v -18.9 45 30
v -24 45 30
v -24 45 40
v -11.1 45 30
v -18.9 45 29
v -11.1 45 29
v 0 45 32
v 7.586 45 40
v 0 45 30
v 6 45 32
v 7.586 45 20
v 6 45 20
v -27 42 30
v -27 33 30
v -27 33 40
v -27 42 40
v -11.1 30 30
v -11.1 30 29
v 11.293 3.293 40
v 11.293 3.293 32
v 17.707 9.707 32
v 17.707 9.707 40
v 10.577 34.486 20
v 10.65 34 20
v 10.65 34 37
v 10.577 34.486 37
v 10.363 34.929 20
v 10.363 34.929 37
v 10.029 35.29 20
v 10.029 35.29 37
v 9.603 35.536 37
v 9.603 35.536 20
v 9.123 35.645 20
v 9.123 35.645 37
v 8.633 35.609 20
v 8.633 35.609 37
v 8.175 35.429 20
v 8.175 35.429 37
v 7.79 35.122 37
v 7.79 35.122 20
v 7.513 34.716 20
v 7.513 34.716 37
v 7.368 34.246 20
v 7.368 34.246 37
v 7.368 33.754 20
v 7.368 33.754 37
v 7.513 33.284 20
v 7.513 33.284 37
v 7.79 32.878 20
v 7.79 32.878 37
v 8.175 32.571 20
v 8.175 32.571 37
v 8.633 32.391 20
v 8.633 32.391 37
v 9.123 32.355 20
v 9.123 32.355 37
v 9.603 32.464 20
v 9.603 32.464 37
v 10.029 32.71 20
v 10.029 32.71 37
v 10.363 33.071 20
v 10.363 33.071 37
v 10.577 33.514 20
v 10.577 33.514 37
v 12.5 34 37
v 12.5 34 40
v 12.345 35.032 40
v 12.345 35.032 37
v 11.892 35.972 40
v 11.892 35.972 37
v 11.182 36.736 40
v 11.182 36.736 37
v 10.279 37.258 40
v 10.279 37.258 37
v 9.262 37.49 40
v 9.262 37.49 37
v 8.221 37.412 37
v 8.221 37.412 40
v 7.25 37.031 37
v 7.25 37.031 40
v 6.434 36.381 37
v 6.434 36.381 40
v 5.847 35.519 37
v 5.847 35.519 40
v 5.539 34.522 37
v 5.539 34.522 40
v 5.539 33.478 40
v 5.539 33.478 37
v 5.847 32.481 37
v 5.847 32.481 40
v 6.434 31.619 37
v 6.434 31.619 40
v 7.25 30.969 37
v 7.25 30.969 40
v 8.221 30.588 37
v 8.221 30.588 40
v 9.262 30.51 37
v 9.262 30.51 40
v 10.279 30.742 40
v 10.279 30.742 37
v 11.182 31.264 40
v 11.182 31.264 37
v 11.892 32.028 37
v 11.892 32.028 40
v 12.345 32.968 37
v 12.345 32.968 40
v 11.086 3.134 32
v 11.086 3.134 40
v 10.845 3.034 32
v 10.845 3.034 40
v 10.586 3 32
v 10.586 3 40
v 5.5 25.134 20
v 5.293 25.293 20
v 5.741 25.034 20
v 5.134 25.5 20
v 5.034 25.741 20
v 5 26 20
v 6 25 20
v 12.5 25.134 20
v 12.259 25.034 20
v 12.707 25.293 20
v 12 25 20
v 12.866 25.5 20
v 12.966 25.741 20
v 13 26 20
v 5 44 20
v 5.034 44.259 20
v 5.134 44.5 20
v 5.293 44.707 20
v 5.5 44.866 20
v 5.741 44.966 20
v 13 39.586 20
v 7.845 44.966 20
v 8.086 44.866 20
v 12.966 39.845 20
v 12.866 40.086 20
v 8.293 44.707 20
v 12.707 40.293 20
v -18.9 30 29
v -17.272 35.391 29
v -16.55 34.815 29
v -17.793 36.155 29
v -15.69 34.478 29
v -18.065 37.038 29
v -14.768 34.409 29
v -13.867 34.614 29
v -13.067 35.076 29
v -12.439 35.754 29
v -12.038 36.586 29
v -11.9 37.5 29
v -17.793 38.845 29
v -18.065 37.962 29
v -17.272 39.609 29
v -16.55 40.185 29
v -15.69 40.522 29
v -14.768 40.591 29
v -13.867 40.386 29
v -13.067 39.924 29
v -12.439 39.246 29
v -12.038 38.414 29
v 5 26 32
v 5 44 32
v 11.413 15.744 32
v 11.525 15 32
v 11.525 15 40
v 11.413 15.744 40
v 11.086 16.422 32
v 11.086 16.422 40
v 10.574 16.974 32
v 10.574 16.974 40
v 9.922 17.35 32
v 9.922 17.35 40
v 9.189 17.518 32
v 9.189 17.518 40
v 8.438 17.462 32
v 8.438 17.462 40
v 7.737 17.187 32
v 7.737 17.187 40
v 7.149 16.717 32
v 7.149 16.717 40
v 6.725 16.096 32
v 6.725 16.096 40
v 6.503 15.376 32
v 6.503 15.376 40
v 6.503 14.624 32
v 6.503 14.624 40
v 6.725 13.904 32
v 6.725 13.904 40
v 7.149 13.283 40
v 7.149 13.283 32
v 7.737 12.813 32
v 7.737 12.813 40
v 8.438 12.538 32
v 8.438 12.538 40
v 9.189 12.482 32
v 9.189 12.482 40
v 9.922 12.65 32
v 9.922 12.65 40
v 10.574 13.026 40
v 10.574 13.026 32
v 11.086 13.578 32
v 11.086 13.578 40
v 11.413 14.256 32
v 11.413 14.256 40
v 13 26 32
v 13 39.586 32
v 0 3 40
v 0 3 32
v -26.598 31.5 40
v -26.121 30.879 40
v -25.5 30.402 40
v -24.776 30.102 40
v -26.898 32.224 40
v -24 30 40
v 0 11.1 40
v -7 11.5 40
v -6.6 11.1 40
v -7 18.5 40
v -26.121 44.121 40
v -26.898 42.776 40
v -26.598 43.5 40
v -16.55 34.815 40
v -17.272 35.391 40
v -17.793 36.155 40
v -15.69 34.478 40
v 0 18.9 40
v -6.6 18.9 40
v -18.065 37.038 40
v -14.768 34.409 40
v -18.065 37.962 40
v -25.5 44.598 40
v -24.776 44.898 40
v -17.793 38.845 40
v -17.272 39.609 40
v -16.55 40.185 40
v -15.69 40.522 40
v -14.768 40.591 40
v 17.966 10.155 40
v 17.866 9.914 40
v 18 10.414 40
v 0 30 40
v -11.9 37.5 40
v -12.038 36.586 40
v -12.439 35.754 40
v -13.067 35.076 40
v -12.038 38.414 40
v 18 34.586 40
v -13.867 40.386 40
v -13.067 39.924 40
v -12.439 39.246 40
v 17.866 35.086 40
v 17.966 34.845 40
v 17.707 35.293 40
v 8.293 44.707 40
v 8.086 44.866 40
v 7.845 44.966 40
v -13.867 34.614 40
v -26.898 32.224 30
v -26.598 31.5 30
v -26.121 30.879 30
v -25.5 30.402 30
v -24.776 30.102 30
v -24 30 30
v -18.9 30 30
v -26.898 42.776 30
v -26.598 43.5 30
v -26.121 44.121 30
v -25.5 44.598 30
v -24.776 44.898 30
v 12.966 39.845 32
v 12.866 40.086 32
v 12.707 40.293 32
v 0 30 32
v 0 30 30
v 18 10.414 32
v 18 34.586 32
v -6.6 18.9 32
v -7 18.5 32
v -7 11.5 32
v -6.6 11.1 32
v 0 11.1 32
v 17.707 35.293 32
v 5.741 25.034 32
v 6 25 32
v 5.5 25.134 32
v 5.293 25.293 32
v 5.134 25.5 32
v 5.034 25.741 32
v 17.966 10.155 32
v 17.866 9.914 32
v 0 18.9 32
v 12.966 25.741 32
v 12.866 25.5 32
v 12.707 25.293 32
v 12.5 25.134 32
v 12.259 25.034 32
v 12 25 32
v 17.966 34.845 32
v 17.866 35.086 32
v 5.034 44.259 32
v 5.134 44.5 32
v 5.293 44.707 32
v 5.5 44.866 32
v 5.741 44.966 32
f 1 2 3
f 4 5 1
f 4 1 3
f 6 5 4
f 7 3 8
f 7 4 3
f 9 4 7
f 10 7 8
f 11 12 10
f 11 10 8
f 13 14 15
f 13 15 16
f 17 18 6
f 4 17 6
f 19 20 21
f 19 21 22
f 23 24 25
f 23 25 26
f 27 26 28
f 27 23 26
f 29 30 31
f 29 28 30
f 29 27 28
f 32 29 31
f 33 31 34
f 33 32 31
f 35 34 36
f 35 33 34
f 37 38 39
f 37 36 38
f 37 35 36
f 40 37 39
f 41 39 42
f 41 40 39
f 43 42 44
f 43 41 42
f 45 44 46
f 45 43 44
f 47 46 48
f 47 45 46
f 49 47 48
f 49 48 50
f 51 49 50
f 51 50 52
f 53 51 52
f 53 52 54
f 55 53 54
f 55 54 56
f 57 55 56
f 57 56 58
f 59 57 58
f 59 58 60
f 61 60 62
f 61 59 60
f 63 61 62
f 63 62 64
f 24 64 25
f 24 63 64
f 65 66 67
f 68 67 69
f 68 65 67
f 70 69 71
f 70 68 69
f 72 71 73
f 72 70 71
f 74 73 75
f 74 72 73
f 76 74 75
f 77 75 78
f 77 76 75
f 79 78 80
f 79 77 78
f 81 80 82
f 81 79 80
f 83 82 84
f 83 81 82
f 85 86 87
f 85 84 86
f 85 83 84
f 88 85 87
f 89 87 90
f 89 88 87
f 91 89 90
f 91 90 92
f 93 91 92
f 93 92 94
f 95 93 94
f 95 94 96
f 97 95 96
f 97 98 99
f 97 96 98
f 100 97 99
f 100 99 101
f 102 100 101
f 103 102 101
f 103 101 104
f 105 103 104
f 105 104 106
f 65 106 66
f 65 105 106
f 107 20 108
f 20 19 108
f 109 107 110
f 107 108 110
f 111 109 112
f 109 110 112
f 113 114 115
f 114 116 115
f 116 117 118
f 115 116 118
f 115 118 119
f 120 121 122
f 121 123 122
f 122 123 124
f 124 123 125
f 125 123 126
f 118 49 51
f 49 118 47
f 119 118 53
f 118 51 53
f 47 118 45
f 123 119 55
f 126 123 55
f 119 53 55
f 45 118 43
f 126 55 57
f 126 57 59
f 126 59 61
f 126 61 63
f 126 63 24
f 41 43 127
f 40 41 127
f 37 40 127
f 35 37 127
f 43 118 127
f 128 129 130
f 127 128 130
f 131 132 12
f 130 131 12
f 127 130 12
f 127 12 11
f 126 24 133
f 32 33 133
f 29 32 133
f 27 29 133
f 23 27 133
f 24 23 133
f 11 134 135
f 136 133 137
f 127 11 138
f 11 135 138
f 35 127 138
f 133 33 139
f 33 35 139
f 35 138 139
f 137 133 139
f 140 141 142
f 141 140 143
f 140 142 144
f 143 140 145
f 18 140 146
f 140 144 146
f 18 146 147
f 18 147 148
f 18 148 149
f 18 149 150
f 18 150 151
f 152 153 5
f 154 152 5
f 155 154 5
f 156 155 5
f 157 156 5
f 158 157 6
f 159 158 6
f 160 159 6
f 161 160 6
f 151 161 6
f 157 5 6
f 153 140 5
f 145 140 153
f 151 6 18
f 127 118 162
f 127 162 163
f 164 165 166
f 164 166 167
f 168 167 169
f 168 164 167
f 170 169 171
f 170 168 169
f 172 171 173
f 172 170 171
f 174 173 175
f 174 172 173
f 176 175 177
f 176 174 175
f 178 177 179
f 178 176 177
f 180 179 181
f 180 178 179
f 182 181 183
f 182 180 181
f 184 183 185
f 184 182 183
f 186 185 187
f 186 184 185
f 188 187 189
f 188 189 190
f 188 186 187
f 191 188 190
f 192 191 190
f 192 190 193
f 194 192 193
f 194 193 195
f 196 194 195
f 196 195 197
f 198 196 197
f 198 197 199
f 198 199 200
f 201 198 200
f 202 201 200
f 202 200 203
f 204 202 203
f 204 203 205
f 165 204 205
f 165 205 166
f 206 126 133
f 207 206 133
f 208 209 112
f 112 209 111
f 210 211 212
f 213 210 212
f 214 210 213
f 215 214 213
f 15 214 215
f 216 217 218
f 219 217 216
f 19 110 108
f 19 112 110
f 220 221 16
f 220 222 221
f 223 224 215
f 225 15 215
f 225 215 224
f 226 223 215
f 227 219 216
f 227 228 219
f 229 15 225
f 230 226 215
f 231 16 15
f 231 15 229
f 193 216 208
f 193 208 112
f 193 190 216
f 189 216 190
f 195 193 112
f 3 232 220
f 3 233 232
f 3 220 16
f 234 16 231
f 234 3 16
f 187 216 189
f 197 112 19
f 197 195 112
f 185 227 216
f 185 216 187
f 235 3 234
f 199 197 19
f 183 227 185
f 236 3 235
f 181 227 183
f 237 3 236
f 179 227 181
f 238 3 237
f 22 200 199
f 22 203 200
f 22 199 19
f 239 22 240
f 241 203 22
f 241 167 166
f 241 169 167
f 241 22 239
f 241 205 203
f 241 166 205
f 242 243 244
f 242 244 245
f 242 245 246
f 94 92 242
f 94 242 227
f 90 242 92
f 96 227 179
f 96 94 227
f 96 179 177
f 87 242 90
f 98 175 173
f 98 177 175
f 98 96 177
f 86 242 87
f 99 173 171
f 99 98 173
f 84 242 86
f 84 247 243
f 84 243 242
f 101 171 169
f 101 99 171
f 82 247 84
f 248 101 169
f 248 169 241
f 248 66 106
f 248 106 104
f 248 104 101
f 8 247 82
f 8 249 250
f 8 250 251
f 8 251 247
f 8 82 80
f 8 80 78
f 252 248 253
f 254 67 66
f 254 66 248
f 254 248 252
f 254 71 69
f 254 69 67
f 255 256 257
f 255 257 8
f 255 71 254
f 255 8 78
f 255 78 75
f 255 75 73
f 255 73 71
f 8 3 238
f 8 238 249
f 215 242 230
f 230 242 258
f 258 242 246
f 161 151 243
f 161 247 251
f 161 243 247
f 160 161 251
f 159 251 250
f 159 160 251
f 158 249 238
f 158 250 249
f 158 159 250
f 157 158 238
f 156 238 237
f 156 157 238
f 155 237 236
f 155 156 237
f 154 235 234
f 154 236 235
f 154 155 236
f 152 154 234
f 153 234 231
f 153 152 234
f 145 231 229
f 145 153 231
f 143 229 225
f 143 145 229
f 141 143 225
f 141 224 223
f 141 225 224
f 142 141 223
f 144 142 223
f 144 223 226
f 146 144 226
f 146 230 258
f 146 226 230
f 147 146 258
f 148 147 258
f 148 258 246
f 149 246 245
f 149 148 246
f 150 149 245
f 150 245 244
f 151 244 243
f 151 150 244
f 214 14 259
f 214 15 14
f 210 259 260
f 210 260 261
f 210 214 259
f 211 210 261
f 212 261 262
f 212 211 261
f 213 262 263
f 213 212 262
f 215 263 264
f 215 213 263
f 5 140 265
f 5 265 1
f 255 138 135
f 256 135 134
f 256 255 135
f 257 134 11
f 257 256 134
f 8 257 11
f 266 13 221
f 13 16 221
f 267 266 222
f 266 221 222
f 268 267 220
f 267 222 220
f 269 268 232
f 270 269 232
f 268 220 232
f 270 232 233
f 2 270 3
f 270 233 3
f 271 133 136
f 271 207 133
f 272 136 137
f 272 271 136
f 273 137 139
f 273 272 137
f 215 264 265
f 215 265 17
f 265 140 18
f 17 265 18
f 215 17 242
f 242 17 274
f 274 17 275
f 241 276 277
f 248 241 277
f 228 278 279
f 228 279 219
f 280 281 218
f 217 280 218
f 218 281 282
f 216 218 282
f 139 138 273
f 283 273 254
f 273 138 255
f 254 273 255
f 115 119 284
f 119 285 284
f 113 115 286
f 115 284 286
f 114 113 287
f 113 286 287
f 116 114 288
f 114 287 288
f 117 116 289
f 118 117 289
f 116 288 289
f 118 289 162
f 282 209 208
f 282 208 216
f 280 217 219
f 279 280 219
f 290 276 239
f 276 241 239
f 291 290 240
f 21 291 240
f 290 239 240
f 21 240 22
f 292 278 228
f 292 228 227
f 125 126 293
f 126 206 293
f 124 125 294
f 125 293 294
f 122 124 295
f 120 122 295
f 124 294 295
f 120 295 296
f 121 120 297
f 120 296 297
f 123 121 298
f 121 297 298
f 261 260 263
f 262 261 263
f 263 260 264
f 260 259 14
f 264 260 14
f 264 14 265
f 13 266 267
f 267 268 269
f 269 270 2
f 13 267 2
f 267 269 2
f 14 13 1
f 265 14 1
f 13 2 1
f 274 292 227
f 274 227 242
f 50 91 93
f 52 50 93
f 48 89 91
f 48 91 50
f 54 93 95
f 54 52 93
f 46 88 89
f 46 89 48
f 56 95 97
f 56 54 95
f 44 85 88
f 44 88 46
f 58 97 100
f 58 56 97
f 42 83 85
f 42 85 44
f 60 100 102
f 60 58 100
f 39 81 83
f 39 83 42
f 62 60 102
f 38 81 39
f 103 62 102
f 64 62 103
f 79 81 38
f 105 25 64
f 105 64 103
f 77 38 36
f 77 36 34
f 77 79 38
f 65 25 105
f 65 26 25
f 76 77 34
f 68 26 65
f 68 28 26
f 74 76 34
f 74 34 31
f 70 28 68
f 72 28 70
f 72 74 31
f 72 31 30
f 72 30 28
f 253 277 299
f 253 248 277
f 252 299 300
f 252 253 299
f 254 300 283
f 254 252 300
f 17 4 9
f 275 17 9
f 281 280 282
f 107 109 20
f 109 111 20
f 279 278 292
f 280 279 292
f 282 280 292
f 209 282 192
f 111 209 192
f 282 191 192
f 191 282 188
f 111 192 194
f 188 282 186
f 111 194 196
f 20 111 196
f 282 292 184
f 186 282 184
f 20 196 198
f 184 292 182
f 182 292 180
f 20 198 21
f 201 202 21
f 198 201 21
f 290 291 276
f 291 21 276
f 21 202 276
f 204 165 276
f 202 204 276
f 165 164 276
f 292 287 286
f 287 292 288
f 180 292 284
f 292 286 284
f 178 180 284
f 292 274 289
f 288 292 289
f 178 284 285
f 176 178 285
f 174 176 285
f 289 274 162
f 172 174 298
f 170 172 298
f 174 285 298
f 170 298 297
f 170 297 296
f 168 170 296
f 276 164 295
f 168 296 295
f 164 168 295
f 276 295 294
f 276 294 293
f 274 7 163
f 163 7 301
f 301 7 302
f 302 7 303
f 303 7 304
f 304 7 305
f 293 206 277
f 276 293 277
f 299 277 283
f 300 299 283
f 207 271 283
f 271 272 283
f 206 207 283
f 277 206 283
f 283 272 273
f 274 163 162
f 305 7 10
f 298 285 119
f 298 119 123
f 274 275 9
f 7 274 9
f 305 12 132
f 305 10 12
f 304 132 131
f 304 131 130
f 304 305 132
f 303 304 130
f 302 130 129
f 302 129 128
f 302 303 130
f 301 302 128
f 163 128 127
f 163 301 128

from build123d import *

# Parameters (mm, degrees)
CYLINDER006_R     = 3.5
CYLINDER006_DEPTH = 10
CYLINDER005_R     = 1.65
CYLINDER005_DEPTH = 31
CYLINDER001_R     = 2.525
CYLINDER001_DEPTH = 35
CYLINDER009_R     = 3.1
CYLINDER009_DEPTH = 19
BOX013_W          = 7.8
BOX013_H          = 15
BOX013_DEPTH      = 1
BOX015_W          = 8
BOX015_H          = 20
BOX015_DEPTH      = 12
CHAMFER007_SIZE   = 5
FILLET001_R       = 1
FILLET_R          = 1
BOX009_W          = 7
BOX009_H          = 7.8
BOX009_DEPTH      = 8
CHAMFER006_SIZE   = 0.4
BOX010_W          = 18
BOX010_H          = 42
BOX010_DEPTH      = 8
CHAMFER008_SIZE   = 7
CHAMFER009_SIZE   = 10
FILLET003_R       = 1
BOX011_W          = 27
BOX011_H          = 15
BOX011_DEPTH      = 10
FILLET004_R       = 3


with BuildPart() as cylinder006:
    # Cylinder006 → Cylinder006 (new body)
    with BuildSketch(Plane(origin=(9, 34, 37), x_dir=(1, 0, 0), z_dir=(0, 0, 1))):
        Circle(CYLINDER006_R)
    extrude(amount=CYLINDER006_DEPTH)


with BuildPart() as fusion009:
    # Cylinder005 → Cylinder005 (new body)
    with BuildSketch(Plane(origin=(9, 34, 19), x_dir=(1, 0, 0), z_dir=(0, 0, 1))):
        Circle(CYLINDER005_R)
    extrude(amount=CYLINDER005_DEPTH)

    # Fusion009: union Cylinder006
    add(cylinder006.part)


with BuildPart() as cylinder001:
    # Cylinder001 → Cylinder001 (new body)
    with BuildSketch(Plane(origin=(9, 15, 5), x_dir=(1, 0, 0), z_dir=(0, 0, 1))):
        Circle(CYLINDER001_R)
    extrude(amount=CYLINDER001_DEPTH)


with BuildPart() as cylinder009:
    # Cylinder009 → Cylinder009 (new body)
    with BuildSketch(Plane(origin=(-15, 37.5, 25), x_dir=(1, 0, 0), z_dir=(0, 0, 1))):
        Circle(CYLINDER009_R)
    extrude(amount=CYLINDER009_DEPTH)


with BuildPart() as cube013:
    # Box013 → Box013 (new body)
    with BuildSketch(Plane(origin=(-18.9, 30, 29), x_dir=(1, 0, 0), z_dir=(0, 0, 1))):
        with Locations((3.9, 7.5)):
            Rectangle(BOX013_W, BOX013_H)
    extrude(amount=BOX013_DEPTH)


with BuildPart() as fillet_body:
    # Box015 → Box015 (new body)
    with BuildSketch(Plane(origin=(7, 25, 20), x_dir=(1, 0, 0), z_dir=(0, 0, 1))):
        with Locations((4, 10)):
            Rectangle(BOX015_W, BOX015_H)
    extrude(amount=BOX015_DEPTH)

    # Chamfer007
    chamfer007_edges = [fillet_body.edges().sort_by_distance(p)[0] for p in [
        (15, 45, 26),
    ]]
    chamfer(chamfer007_edges, length=CHAMFER007_SIZE)

    # Fillet001
    fillet001_edges = [fillet_body.edges().sort_by_distance(p)[0] for p in [
        (15, 40, 26),
        (15, 25, 26),
        (7, 25, 26),
        (7, 45, 26),
    ]]
    fillet(fillet001_edges, radius=FILLET001_R)


with BuildPart() as fillet_body_1:
    # Fillet001 placement: moved
    add(fillet_body.part.moved(Location((-2, 0, 0))))

    # Fillet
    fillet_edges = [fillet_body_1.edges().sort_by_distance(p)[0] for p in [
        (8, 45, 26),
    ]]
    fillet(fillet_edges, radius=FILLET_R)


with BuildPart() as chamfer006:
    # Box009 → Box009 (new body)
    with BuildSketch(Plane(origin=(-7, 11.1, 32), x_dir=(1, 0, 0), z_dir=(0, 0, 1))):
        with Locations((3.5, 3.9)):
            Rectangle(BOX009_W, BOX009_H)
    extrude(amount=BOX009_DEPTH)

    # Chamfer006
    chamfer006_edges = [chamfer006.edges().sort_by_distance(p)[0] for p in [
        (-7, 11.1, 36),
        (-7, 18.9, 36),
    ]]
    chamfer(chamfer006_edges, length=CHAMFER006_SIZE)


with BuildPart() as fillet003:
    # Box010 → Box010 (new body)
    with BuildSketch(Plane(origin=(0, 3, 32), x_dir=(1, 0, 0), z_dir=(0, 0, 1))):
        with Locations((9, 21)):
            Rectangle(BOX010_W, BOX010_H)
    extrude(amount=BOX010_DEPTH)

    # Chamfer008
    chamfer008_edges = [fillet003.edges().sort_by_distance(p)[0] for p in [
        (18, 3, 36),
    ]]
    chamfer(chamfer008_edges, length=CHAMFER008_SIZE)

    # Chamfer009
    chamfer009_edges = [fillet003.edges().sort_by_distance(p)[0] for p in [
        (18, 45, 36),
    ]]
    chamfer(chamfer009_edges, length=CHAMFER009_SIZE)

    # Fillet003
    fillet003_edges = [fillet003.edges().sort_by_distance(p)[0] for p in [
        (18, 35, 36),
        (18, 10, 36),
        (8, 45, 36),
        (11, 3, 36),
    ]]
    fillet(fillet003_edges, radius=FILLET003_R)


with BuildPart() as cut002002002009004:
    # Box011 → Box011 (new body)
    with BuildSketch(Plane(origin=(-27, 30, 30), x_dir=(1, 0, 0), z_dir=(0, 0, 1))):
        with Locations((13.5, 7.5)):
            Rectangle(BOX011_W, BOX011_H)
    extrude(amount=BOX011_DEPTH)

    # Fillet004
    fillet004_edges = [cut002002002009004.edges().sort_by_distance(p)[0] for p in [
        (-27, 30, 35),
        (-27, 45, 35),
    ]]
    fillet(fillet004_edges, radius=FILLET004_R)

    # Fusion010: union Cube013, Fillet body, Chamfer006, Fillet003
    add(cube013.part)
    add(fillet_body_1.part)
    add(chamfer006.part)
    add(fillet003.part)

    # Cut002002002009002: cut Cylinder009
    add(cylinder009.part, mode=Mode.SUBTRACT)

    # Cut002002002009003: cut Cylinder001
    add(cylinder001.part, mode=Mode.SUBTRACT)

    # Cut002002002009004: cut Fusion009
    add(fusion009.part, mode=Mode.SUBTRACT)


solid = cut002002002009004.part
